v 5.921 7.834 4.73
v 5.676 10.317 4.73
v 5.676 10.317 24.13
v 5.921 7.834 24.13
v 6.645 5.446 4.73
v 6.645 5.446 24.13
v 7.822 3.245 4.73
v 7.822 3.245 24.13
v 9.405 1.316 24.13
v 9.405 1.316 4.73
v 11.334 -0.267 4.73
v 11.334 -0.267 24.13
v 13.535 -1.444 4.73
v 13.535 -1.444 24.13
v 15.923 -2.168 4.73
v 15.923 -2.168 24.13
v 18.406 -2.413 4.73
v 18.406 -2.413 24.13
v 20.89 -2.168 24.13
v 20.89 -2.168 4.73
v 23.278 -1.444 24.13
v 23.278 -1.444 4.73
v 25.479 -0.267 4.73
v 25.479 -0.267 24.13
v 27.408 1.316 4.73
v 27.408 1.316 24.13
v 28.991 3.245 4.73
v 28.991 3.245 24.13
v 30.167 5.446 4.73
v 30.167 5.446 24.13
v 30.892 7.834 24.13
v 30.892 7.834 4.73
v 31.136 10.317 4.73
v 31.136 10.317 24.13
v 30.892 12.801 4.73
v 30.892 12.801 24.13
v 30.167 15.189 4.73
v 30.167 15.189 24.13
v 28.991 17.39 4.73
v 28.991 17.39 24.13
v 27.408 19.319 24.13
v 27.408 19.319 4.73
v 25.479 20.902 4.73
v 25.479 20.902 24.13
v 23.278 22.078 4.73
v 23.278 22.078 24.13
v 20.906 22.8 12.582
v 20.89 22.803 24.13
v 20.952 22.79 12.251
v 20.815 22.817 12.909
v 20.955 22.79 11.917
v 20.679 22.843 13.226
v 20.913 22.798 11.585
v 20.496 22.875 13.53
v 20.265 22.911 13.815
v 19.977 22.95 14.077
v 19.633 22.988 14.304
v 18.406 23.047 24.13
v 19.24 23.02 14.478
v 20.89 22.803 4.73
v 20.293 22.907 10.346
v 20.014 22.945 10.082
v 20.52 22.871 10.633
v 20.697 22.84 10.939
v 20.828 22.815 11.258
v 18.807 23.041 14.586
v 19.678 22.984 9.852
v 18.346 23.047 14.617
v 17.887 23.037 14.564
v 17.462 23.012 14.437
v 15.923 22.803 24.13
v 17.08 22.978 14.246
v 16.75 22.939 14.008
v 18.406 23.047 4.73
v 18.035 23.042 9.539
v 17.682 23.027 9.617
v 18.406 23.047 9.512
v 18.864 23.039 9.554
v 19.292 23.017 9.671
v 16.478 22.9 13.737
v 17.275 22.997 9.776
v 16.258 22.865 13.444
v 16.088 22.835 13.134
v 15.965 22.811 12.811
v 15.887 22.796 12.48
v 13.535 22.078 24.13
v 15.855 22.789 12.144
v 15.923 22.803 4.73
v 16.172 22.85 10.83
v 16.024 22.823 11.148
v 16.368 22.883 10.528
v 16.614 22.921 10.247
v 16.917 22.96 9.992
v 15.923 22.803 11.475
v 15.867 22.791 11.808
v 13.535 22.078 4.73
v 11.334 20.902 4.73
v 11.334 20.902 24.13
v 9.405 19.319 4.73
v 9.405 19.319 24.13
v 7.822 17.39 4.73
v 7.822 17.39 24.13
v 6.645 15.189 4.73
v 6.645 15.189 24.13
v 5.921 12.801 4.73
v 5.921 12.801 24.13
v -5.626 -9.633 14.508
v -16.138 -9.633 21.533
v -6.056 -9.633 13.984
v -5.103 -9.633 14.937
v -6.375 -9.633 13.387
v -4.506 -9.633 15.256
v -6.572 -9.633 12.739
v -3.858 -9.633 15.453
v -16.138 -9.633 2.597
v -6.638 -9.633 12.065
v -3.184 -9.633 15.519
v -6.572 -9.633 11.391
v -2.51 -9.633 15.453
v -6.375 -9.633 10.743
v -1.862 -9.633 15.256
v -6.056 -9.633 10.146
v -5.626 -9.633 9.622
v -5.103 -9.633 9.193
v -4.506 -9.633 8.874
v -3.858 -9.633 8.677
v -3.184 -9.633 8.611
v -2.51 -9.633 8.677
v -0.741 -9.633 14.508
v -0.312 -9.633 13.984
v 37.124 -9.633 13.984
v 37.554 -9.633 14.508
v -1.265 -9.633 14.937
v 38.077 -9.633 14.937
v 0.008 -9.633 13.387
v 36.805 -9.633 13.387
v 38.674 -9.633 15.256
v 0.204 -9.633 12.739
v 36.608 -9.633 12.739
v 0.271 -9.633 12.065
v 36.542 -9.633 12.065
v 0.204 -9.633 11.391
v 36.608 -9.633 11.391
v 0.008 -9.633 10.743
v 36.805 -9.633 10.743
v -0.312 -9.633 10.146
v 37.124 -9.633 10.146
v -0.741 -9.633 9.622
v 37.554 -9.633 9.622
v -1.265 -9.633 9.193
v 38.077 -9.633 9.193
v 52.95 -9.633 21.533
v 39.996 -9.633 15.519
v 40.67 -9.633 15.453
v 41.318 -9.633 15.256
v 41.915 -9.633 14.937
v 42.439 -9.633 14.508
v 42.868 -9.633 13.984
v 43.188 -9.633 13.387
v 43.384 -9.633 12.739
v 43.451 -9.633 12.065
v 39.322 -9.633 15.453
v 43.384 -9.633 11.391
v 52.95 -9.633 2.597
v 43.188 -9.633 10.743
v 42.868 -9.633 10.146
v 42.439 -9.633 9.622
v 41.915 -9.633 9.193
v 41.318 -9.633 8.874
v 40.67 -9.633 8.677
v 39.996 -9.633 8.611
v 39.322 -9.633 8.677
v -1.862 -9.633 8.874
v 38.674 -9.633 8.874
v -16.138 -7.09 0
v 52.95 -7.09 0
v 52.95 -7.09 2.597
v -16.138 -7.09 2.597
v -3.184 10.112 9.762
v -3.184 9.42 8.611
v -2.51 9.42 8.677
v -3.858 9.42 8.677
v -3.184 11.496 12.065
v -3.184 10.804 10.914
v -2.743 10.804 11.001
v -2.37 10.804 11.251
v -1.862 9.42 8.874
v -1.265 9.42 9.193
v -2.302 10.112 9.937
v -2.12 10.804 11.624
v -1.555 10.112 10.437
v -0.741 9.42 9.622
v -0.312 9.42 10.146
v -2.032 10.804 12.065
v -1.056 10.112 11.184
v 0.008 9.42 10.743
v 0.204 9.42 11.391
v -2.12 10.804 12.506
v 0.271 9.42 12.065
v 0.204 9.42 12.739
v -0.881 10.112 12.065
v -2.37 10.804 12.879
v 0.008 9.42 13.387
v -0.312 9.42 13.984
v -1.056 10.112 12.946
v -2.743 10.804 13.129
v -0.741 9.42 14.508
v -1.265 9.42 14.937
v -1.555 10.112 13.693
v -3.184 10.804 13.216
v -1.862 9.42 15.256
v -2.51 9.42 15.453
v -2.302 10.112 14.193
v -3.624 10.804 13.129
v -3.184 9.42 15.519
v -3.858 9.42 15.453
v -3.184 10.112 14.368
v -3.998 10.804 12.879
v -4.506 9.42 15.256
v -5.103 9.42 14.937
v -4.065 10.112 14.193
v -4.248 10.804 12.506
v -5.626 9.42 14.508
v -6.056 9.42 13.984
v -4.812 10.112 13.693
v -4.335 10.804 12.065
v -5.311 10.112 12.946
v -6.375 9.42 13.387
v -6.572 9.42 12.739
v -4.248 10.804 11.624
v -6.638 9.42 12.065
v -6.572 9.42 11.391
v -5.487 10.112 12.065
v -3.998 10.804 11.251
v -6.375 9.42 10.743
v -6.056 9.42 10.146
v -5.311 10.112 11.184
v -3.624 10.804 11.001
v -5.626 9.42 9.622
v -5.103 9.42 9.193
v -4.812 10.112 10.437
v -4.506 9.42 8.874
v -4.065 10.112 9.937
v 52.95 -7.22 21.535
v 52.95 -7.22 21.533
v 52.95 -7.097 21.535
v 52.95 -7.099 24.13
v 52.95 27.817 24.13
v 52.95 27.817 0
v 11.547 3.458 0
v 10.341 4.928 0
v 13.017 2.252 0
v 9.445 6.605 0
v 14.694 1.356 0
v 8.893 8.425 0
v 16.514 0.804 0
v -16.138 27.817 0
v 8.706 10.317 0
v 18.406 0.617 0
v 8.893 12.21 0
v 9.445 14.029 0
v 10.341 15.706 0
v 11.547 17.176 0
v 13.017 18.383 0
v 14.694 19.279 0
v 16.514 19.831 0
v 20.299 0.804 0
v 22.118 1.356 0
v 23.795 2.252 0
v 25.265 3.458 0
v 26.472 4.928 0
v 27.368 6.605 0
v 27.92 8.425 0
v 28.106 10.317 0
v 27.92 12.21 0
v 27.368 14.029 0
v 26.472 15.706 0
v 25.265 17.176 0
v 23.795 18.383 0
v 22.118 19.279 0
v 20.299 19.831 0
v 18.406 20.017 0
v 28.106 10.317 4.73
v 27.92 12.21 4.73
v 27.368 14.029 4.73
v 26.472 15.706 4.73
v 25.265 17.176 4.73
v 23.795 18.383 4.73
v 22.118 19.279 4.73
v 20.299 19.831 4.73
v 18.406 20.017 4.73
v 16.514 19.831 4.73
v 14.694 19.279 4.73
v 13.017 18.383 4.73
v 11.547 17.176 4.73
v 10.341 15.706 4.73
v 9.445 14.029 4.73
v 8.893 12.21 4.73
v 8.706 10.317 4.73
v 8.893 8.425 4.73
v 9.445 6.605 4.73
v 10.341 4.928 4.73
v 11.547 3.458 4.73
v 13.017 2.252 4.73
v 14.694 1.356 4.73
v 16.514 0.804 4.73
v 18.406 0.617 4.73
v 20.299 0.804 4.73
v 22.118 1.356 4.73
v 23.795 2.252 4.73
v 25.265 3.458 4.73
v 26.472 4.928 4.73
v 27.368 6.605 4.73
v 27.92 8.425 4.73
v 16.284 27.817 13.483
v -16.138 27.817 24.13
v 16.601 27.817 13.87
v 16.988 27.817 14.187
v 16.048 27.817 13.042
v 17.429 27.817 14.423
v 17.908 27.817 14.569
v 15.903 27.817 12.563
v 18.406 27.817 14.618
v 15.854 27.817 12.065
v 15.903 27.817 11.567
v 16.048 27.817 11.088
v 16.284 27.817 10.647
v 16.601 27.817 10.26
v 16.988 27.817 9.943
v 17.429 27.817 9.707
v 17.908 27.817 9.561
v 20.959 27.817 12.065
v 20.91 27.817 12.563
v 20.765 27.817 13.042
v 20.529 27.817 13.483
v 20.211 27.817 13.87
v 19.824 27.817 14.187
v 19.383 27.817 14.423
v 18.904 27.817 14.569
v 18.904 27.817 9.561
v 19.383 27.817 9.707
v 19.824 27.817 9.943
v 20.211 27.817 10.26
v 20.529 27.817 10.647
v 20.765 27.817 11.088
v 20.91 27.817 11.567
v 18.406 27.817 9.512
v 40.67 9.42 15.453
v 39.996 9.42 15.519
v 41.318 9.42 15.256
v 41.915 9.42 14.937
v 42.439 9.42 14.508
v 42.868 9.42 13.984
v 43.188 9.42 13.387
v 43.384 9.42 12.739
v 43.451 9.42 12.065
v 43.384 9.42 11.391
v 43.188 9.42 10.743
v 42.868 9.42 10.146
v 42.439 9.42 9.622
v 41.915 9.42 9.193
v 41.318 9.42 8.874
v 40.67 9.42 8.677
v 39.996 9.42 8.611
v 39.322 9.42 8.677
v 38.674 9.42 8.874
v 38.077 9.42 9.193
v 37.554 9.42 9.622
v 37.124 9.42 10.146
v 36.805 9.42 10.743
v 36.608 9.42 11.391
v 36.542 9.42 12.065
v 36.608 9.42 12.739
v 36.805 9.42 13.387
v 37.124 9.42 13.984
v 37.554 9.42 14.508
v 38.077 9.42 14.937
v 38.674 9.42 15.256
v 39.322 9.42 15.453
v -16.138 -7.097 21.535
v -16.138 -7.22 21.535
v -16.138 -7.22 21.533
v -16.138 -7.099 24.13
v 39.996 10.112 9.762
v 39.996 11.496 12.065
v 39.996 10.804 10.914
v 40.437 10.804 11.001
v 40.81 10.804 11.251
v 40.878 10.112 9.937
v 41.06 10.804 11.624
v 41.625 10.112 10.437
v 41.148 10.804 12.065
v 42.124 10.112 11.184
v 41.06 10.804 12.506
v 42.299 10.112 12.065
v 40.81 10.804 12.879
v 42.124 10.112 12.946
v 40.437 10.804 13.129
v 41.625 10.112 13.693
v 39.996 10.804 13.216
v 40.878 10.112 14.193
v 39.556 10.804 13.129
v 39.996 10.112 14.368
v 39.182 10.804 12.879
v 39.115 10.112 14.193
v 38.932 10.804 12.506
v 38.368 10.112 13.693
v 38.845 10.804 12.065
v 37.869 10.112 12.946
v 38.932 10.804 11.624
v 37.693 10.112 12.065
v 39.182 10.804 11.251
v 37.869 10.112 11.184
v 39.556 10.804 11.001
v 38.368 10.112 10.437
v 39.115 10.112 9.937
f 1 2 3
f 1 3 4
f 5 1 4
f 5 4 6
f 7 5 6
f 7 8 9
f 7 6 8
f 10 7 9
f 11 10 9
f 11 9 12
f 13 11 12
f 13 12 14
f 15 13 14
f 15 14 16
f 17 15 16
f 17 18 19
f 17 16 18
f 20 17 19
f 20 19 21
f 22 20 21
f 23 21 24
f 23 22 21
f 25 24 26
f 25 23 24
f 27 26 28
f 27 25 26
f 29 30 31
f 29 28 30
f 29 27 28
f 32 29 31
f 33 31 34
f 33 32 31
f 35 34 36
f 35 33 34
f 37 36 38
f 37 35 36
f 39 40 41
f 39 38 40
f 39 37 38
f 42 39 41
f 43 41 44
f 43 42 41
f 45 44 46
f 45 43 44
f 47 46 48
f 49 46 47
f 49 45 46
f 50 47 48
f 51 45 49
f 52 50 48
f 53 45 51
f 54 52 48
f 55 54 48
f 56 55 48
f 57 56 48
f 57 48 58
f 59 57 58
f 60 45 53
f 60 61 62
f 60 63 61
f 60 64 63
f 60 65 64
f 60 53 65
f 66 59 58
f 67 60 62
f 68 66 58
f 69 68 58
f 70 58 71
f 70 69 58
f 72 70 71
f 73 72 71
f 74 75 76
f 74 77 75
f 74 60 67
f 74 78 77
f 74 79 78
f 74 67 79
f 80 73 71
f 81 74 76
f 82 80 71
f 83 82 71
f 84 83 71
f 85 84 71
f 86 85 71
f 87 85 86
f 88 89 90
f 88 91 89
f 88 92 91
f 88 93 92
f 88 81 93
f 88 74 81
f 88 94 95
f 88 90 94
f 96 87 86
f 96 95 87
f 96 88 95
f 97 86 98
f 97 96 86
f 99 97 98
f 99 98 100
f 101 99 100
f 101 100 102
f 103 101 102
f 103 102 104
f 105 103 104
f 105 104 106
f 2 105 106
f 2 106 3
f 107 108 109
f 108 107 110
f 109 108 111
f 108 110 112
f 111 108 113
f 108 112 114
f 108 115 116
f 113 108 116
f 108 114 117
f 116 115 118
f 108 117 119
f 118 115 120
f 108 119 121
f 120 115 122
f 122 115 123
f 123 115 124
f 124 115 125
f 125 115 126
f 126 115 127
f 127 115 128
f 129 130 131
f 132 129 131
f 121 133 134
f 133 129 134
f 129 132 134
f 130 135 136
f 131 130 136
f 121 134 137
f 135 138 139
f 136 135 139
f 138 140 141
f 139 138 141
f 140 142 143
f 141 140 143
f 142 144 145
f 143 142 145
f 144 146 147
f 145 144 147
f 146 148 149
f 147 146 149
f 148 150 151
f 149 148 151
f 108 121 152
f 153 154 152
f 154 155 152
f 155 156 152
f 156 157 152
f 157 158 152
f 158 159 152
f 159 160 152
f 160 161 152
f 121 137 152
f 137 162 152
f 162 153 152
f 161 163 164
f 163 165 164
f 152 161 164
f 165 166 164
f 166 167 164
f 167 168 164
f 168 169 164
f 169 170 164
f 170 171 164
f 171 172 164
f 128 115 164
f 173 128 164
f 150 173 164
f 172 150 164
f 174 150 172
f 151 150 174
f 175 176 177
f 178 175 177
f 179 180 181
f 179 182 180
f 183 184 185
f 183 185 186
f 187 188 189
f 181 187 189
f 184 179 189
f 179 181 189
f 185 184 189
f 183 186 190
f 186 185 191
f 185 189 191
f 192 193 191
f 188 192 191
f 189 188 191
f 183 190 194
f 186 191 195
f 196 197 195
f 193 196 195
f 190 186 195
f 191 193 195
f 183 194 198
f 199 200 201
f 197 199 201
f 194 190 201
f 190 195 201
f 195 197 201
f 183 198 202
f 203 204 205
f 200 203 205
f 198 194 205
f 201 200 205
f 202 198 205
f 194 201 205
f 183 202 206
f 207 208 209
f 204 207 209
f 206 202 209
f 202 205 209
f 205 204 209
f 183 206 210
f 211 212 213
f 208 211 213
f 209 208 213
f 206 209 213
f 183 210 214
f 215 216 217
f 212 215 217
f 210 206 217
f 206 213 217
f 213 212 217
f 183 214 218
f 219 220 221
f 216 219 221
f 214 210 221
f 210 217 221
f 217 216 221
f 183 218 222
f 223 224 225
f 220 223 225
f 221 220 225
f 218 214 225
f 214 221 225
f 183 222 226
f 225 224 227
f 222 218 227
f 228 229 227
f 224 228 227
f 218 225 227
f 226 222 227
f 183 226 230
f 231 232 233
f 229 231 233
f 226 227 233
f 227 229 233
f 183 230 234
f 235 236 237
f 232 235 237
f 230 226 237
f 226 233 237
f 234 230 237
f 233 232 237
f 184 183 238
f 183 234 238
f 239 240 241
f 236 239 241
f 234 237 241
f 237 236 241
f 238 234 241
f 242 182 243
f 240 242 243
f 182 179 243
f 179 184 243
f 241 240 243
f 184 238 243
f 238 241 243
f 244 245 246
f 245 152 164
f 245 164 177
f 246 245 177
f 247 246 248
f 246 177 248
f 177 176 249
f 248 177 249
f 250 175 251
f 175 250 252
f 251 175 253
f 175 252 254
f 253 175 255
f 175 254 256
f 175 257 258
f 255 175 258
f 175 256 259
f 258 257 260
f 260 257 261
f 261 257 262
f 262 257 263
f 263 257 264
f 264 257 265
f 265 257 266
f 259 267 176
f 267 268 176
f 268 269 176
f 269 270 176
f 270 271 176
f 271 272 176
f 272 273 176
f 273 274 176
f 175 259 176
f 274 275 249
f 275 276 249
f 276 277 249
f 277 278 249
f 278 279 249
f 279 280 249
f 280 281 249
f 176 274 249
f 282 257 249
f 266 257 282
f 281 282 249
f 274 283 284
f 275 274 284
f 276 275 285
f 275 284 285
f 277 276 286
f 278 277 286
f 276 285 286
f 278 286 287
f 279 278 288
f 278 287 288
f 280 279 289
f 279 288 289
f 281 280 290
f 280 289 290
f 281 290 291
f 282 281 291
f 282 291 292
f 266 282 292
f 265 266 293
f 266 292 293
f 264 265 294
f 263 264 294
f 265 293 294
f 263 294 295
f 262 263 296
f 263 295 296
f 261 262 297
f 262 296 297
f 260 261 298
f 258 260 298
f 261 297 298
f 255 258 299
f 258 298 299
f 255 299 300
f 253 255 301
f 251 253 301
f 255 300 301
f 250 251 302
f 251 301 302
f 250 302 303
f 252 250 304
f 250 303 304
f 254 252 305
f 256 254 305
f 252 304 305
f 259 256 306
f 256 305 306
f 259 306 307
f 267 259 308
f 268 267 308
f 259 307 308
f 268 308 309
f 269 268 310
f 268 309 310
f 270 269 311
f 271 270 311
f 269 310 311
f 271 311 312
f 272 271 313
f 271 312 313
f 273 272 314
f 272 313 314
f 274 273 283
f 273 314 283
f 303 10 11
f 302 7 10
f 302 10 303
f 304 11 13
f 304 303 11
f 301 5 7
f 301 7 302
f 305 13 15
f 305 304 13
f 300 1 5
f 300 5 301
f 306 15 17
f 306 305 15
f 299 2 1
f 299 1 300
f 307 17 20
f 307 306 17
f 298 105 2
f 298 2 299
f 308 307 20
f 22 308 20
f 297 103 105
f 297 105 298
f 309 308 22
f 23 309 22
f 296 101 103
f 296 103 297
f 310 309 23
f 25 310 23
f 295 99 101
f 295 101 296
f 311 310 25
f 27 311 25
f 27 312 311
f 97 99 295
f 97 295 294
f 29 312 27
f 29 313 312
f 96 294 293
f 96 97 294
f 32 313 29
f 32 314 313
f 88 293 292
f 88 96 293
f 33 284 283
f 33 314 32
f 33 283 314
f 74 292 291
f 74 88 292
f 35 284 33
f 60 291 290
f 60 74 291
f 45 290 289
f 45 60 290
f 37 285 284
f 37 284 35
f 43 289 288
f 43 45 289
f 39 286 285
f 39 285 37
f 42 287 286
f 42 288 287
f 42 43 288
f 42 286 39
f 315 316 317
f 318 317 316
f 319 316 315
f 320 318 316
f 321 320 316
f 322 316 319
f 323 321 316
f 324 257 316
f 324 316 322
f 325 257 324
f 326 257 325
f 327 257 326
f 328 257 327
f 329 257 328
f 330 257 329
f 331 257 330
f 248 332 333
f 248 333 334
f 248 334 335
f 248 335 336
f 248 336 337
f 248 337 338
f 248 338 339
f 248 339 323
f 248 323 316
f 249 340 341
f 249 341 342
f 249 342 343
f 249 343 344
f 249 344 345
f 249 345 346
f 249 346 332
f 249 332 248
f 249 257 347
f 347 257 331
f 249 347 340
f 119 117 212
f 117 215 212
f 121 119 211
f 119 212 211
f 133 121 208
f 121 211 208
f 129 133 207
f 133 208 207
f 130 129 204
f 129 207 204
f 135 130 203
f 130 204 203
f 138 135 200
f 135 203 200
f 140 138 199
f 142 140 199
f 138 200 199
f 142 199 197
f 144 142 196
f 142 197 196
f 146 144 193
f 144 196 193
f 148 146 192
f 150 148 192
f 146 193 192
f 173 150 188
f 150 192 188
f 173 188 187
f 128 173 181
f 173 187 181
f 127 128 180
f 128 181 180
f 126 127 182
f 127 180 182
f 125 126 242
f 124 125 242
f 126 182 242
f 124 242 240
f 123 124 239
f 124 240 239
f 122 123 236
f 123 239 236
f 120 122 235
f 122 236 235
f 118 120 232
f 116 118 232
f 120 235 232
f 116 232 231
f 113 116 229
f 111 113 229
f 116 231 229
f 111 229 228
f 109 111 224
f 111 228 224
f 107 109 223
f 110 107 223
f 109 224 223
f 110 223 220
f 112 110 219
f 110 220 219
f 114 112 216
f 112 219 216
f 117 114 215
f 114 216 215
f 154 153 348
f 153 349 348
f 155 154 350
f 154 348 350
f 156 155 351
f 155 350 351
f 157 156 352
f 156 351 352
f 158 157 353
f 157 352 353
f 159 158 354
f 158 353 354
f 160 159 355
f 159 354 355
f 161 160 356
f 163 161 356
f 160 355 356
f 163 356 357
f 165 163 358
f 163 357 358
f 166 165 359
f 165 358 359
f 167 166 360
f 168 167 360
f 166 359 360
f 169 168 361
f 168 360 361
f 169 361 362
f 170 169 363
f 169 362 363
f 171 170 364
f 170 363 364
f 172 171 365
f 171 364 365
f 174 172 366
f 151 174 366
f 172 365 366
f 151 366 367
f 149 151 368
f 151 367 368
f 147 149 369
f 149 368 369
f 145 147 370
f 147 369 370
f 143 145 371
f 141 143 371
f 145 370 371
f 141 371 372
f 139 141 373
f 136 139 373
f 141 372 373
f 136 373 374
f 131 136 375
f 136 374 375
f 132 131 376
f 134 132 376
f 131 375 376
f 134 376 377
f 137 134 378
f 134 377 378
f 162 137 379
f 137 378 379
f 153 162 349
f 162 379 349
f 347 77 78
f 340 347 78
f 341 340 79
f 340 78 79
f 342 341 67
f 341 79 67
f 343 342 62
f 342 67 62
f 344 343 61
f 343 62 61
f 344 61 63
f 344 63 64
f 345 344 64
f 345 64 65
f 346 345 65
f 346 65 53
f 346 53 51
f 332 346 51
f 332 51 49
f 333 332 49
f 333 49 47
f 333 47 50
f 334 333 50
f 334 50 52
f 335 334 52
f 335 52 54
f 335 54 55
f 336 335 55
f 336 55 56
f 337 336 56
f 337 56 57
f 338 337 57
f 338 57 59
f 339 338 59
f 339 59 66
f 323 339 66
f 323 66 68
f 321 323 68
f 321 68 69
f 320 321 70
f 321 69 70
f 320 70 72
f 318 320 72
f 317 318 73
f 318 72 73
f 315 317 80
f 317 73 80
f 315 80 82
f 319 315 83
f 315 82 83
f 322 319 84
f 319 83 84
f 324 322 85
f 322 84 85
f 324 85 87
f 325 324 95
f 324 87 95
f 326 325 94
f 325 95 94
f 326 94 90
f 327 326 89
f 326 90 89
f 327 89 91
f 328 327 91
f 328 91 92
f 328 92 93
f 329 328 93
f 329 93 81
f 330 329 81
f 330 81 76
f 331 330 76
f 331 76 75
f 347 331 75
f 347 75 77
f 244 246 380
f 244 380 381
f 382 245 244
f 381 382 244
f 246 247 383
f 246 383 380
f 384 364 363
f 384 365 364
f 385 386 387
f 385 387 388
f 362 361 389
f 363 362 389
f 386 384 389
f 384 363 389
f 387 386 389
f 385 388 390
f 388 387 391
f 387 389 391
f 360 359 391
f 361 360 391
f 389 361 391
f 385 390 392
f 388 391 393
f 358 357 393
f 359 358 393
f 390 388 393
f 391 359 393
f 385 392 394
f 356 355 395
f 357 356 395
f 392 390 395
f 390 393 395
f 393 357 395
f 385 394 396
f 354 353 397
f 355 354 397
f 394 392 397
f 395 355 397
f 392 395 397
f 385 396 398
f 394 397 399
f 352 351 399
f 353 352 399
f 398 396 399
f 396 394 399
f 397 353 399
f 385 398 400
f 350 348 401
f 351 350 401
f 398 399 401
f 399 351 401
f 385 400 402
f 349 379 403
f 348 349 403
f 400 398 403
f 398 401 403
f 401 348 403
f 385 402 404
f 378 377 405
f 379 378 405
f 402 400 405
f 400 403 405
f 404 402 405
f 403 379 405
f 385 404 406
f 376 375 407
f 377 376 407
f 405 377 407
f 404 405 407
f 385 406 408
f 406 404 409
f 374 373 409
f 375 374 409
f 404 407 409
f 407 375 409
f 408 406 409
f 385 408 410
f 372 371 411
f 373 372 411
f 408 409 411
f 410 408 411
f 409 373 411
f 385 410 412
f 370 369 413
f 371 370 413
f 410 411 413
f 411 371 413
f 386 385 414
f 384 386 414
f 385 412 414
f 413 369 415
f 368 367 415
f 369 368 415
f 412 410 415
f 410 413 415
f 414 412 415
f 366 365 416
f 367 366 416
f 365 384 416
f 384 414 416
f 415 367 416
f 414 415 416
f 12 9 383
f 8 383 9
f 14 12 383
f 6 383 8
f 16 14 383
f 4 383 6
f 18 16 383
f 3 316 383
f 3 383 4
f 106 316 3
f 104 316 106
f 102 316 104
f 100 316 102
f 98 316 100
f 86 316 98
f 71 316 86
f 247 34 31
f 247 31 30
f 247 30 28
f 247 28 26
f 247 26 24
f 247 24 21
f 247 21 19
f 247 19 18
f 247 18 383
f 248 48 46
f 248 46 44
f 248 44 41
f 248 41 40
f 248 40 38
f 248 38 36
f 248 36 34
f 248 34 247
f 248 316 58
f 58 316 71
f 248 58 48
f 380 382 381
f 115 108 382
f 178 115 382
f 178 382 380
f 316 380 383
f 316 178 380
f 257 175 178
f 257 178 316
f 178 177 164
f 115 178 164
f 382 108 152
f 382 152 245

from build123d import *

# Parameters (mm, degrees)
SKETCH1_W                    = 69.088
SKETCH1_H                    = 37.45
EXTRUDE1_DEPTH               = 24.13
CUT_EXTRUDE1_DEPTH           = 8.128
CUT_EXTRUDE1_DEPTH_BACK      = 83.312
CUT_EXTRUDE4_DEPTH           = 25.4
CUT_EXTRUDE4_DEPTH_BACK      = 89.662
SKETCH11_W                   = 7.556551936
SKETCH11_H                   = 2.543
F_5_16_24_TAPPED_HOLE1_D     = 6.9088
F_5_16_24_TAPPED_HOLE1_DEPTH = 19.05254
F_5_16_24_TAPPED_HOLE1_TIP   = 2.075612922
CUT_EXTRUDE5_DEPTH           = 38.608
CUT_EXTRUDE5_DEPTH_BACK      = 11.938
SKETCH15_R                   = 12.72999994
SKETCH16_R                   = 14.7
SKETCH16_R_2                 = 9.7
BOSS_EXTRUDE1_DEPTH          = 4.73
F_1_4_20_TAPPED_HOLE2_D      = 5.1054
F_1_4_20_TAPPED_HOLE2_DEPTH  = 16.51
F_1_4_20_TAPPED_HOLE2_TIP    = 1.533816902


with BuildPart() as part:
    # Sketch1 → Extrude1 (new body)
    with BuildSketch(Plane.XY):
        with Locations((18.406260253, 9.092395655)):
            Rectangle(SKETCH1_W, SKETCH1_H)
    extrude(amount=EXTRUDE1_DEPTH)

    # Sketch2 → Cut-Extrude1 (cut, two sides: drawn at the far end of the back side and taken through both)
    with BuildSketch(Plane.ZY.offset(16.137739747).offset(-CUT_EXTRUDE1_DEPTH_BACK)):
        with BuildLine():
            Line((-1.394410139, -7.219604345), (2.59715, -7.219604345))
            Line((2.59715, -7.219604345), (2.59715, -10.370080057))
            Line((2.59715, -10.370080057), (21.53285, -10.370080057))
            Line((21.53285, -10.370080057), (21.53285, -7.219604345))
            Line((21.53285, -7.219604345), (26.024229083, -7.219604345))
            ThreePointArc((26.024229083, -7.219604345), (12.314909472, -19.255117467), (-1.394410139, -7.219604345))
        make_face()
    extrude(amount=CUT_EXTRUDE1_DEPTH + CUT_EXTRUDE1_DEPTH_BACK, mode=Mode.SUBTRACT)

    # Sketch11 → Cut-Extrude4 (cut, two sides: drawn at the far end of the back side and taken through both)
    with BuildSketch(Plane.ZY.offset(16.137739747).offset(-CUT_EXTRUDE4_DEPTH_BACK)):
        with Locations((-1.181125968, -8.361104345)):
            Rectangle(SKETCH11_W, SKETCH11_H)
        Polygon((21.534784946, -7.096819318), (21.532847251, -9.63981858), (29.089396994, -9.645576459), (29.091334688, -7.102577197), align=None)
    extrude(amount=CUT_EXTRUDE4_DEPTH + CUT_EXTRUDE4_DEPTH_BACK, mode=Mode.SUBTRACT)

    # 5/16-24 Tapped Hole1
    with Locations(Plane(origin=(-3.183739747, -9.632604345, 12.065), x_dir=(0, 0, -1), z_dir=(0, -1, 0))):
        with Locations((0, 0), (0, 43.18)):
            Hole(F_5_16_24_TAPPED_HOLE1_D / 2, depth=F_5_16_24_TAPPED_HOLE1_DEPTH)
            with Locations((0, 0, -(F_5_16_24_TAPPED_HOLE1_DEPTH + F_5_16_24_TAPPED_HOLE1_TIP / 2))):  # 118° drill point
                Cone(0, F_5_16_24_TAPPED_HOLE1_D / 2, F_5_16_24_TAPPED_HOLE1_TIP, mode=Mode.SUBTRACT)

    # Sketch15 → Cut-Extrude5 (cut, two sides: drawn at the far end of the back side and taken through both)
    with BuildSketch(Plane.XY.offset(-CUT_EXTRUDE5_DEPTH_BACK)):
        with Locations(Location((18.406260253, 10.317395655, 0), (0, 0, 180))):
            Circle(SKETCH15_R)
    extrude(amount=CUT_EXTRUDE5_DEPTH + CUT_EXTRUDE5_DEPTH_BACK, mode=Mode.SUBTRACT)

    # Sketch16 → Boss-Extrude1 (add)
    with BuildSketch(Plane.XY.offset(4.73)):
        with Locations((18.406260253, 10.317395655)):
            Circle(SKETCH16_R)
        with Locations((18.406260253, 10.317395655)):
            Circle(SKETCH16_R_2, mode=Mode.SUBTRACT)
    extrude(amount=-BOSS_EXTRUDE1_DEPTH)

    # 1/4-20 Tapped Hole2
    with Locations(Plane(origin=(18.406260253, 27.817395655, 12.065), x_dir=(0, 0, 1), z_dir=(0, 1, 0))):
        with Locations((0, 0)):
            Hole(F_1_4_20_TAPPED_HOLE2_D / 2, depth=F_1_4_20_TAPPED_HOLE2_DEPTH)
            with Locations((0, 0, -(F_1_4_20_TAPPED_HOLE2_DEPTH + F_1_4_20_TAPPED_HOLE2_TIP / 2))):  # 118° drill point
                Cone(0, F_1_4_20_TAPPED_HOLE2_D / 2, F_1_4_20_TAPPED_HOLE2_TIP, mode=Mode.SUBTRACT)


solid = part.part
